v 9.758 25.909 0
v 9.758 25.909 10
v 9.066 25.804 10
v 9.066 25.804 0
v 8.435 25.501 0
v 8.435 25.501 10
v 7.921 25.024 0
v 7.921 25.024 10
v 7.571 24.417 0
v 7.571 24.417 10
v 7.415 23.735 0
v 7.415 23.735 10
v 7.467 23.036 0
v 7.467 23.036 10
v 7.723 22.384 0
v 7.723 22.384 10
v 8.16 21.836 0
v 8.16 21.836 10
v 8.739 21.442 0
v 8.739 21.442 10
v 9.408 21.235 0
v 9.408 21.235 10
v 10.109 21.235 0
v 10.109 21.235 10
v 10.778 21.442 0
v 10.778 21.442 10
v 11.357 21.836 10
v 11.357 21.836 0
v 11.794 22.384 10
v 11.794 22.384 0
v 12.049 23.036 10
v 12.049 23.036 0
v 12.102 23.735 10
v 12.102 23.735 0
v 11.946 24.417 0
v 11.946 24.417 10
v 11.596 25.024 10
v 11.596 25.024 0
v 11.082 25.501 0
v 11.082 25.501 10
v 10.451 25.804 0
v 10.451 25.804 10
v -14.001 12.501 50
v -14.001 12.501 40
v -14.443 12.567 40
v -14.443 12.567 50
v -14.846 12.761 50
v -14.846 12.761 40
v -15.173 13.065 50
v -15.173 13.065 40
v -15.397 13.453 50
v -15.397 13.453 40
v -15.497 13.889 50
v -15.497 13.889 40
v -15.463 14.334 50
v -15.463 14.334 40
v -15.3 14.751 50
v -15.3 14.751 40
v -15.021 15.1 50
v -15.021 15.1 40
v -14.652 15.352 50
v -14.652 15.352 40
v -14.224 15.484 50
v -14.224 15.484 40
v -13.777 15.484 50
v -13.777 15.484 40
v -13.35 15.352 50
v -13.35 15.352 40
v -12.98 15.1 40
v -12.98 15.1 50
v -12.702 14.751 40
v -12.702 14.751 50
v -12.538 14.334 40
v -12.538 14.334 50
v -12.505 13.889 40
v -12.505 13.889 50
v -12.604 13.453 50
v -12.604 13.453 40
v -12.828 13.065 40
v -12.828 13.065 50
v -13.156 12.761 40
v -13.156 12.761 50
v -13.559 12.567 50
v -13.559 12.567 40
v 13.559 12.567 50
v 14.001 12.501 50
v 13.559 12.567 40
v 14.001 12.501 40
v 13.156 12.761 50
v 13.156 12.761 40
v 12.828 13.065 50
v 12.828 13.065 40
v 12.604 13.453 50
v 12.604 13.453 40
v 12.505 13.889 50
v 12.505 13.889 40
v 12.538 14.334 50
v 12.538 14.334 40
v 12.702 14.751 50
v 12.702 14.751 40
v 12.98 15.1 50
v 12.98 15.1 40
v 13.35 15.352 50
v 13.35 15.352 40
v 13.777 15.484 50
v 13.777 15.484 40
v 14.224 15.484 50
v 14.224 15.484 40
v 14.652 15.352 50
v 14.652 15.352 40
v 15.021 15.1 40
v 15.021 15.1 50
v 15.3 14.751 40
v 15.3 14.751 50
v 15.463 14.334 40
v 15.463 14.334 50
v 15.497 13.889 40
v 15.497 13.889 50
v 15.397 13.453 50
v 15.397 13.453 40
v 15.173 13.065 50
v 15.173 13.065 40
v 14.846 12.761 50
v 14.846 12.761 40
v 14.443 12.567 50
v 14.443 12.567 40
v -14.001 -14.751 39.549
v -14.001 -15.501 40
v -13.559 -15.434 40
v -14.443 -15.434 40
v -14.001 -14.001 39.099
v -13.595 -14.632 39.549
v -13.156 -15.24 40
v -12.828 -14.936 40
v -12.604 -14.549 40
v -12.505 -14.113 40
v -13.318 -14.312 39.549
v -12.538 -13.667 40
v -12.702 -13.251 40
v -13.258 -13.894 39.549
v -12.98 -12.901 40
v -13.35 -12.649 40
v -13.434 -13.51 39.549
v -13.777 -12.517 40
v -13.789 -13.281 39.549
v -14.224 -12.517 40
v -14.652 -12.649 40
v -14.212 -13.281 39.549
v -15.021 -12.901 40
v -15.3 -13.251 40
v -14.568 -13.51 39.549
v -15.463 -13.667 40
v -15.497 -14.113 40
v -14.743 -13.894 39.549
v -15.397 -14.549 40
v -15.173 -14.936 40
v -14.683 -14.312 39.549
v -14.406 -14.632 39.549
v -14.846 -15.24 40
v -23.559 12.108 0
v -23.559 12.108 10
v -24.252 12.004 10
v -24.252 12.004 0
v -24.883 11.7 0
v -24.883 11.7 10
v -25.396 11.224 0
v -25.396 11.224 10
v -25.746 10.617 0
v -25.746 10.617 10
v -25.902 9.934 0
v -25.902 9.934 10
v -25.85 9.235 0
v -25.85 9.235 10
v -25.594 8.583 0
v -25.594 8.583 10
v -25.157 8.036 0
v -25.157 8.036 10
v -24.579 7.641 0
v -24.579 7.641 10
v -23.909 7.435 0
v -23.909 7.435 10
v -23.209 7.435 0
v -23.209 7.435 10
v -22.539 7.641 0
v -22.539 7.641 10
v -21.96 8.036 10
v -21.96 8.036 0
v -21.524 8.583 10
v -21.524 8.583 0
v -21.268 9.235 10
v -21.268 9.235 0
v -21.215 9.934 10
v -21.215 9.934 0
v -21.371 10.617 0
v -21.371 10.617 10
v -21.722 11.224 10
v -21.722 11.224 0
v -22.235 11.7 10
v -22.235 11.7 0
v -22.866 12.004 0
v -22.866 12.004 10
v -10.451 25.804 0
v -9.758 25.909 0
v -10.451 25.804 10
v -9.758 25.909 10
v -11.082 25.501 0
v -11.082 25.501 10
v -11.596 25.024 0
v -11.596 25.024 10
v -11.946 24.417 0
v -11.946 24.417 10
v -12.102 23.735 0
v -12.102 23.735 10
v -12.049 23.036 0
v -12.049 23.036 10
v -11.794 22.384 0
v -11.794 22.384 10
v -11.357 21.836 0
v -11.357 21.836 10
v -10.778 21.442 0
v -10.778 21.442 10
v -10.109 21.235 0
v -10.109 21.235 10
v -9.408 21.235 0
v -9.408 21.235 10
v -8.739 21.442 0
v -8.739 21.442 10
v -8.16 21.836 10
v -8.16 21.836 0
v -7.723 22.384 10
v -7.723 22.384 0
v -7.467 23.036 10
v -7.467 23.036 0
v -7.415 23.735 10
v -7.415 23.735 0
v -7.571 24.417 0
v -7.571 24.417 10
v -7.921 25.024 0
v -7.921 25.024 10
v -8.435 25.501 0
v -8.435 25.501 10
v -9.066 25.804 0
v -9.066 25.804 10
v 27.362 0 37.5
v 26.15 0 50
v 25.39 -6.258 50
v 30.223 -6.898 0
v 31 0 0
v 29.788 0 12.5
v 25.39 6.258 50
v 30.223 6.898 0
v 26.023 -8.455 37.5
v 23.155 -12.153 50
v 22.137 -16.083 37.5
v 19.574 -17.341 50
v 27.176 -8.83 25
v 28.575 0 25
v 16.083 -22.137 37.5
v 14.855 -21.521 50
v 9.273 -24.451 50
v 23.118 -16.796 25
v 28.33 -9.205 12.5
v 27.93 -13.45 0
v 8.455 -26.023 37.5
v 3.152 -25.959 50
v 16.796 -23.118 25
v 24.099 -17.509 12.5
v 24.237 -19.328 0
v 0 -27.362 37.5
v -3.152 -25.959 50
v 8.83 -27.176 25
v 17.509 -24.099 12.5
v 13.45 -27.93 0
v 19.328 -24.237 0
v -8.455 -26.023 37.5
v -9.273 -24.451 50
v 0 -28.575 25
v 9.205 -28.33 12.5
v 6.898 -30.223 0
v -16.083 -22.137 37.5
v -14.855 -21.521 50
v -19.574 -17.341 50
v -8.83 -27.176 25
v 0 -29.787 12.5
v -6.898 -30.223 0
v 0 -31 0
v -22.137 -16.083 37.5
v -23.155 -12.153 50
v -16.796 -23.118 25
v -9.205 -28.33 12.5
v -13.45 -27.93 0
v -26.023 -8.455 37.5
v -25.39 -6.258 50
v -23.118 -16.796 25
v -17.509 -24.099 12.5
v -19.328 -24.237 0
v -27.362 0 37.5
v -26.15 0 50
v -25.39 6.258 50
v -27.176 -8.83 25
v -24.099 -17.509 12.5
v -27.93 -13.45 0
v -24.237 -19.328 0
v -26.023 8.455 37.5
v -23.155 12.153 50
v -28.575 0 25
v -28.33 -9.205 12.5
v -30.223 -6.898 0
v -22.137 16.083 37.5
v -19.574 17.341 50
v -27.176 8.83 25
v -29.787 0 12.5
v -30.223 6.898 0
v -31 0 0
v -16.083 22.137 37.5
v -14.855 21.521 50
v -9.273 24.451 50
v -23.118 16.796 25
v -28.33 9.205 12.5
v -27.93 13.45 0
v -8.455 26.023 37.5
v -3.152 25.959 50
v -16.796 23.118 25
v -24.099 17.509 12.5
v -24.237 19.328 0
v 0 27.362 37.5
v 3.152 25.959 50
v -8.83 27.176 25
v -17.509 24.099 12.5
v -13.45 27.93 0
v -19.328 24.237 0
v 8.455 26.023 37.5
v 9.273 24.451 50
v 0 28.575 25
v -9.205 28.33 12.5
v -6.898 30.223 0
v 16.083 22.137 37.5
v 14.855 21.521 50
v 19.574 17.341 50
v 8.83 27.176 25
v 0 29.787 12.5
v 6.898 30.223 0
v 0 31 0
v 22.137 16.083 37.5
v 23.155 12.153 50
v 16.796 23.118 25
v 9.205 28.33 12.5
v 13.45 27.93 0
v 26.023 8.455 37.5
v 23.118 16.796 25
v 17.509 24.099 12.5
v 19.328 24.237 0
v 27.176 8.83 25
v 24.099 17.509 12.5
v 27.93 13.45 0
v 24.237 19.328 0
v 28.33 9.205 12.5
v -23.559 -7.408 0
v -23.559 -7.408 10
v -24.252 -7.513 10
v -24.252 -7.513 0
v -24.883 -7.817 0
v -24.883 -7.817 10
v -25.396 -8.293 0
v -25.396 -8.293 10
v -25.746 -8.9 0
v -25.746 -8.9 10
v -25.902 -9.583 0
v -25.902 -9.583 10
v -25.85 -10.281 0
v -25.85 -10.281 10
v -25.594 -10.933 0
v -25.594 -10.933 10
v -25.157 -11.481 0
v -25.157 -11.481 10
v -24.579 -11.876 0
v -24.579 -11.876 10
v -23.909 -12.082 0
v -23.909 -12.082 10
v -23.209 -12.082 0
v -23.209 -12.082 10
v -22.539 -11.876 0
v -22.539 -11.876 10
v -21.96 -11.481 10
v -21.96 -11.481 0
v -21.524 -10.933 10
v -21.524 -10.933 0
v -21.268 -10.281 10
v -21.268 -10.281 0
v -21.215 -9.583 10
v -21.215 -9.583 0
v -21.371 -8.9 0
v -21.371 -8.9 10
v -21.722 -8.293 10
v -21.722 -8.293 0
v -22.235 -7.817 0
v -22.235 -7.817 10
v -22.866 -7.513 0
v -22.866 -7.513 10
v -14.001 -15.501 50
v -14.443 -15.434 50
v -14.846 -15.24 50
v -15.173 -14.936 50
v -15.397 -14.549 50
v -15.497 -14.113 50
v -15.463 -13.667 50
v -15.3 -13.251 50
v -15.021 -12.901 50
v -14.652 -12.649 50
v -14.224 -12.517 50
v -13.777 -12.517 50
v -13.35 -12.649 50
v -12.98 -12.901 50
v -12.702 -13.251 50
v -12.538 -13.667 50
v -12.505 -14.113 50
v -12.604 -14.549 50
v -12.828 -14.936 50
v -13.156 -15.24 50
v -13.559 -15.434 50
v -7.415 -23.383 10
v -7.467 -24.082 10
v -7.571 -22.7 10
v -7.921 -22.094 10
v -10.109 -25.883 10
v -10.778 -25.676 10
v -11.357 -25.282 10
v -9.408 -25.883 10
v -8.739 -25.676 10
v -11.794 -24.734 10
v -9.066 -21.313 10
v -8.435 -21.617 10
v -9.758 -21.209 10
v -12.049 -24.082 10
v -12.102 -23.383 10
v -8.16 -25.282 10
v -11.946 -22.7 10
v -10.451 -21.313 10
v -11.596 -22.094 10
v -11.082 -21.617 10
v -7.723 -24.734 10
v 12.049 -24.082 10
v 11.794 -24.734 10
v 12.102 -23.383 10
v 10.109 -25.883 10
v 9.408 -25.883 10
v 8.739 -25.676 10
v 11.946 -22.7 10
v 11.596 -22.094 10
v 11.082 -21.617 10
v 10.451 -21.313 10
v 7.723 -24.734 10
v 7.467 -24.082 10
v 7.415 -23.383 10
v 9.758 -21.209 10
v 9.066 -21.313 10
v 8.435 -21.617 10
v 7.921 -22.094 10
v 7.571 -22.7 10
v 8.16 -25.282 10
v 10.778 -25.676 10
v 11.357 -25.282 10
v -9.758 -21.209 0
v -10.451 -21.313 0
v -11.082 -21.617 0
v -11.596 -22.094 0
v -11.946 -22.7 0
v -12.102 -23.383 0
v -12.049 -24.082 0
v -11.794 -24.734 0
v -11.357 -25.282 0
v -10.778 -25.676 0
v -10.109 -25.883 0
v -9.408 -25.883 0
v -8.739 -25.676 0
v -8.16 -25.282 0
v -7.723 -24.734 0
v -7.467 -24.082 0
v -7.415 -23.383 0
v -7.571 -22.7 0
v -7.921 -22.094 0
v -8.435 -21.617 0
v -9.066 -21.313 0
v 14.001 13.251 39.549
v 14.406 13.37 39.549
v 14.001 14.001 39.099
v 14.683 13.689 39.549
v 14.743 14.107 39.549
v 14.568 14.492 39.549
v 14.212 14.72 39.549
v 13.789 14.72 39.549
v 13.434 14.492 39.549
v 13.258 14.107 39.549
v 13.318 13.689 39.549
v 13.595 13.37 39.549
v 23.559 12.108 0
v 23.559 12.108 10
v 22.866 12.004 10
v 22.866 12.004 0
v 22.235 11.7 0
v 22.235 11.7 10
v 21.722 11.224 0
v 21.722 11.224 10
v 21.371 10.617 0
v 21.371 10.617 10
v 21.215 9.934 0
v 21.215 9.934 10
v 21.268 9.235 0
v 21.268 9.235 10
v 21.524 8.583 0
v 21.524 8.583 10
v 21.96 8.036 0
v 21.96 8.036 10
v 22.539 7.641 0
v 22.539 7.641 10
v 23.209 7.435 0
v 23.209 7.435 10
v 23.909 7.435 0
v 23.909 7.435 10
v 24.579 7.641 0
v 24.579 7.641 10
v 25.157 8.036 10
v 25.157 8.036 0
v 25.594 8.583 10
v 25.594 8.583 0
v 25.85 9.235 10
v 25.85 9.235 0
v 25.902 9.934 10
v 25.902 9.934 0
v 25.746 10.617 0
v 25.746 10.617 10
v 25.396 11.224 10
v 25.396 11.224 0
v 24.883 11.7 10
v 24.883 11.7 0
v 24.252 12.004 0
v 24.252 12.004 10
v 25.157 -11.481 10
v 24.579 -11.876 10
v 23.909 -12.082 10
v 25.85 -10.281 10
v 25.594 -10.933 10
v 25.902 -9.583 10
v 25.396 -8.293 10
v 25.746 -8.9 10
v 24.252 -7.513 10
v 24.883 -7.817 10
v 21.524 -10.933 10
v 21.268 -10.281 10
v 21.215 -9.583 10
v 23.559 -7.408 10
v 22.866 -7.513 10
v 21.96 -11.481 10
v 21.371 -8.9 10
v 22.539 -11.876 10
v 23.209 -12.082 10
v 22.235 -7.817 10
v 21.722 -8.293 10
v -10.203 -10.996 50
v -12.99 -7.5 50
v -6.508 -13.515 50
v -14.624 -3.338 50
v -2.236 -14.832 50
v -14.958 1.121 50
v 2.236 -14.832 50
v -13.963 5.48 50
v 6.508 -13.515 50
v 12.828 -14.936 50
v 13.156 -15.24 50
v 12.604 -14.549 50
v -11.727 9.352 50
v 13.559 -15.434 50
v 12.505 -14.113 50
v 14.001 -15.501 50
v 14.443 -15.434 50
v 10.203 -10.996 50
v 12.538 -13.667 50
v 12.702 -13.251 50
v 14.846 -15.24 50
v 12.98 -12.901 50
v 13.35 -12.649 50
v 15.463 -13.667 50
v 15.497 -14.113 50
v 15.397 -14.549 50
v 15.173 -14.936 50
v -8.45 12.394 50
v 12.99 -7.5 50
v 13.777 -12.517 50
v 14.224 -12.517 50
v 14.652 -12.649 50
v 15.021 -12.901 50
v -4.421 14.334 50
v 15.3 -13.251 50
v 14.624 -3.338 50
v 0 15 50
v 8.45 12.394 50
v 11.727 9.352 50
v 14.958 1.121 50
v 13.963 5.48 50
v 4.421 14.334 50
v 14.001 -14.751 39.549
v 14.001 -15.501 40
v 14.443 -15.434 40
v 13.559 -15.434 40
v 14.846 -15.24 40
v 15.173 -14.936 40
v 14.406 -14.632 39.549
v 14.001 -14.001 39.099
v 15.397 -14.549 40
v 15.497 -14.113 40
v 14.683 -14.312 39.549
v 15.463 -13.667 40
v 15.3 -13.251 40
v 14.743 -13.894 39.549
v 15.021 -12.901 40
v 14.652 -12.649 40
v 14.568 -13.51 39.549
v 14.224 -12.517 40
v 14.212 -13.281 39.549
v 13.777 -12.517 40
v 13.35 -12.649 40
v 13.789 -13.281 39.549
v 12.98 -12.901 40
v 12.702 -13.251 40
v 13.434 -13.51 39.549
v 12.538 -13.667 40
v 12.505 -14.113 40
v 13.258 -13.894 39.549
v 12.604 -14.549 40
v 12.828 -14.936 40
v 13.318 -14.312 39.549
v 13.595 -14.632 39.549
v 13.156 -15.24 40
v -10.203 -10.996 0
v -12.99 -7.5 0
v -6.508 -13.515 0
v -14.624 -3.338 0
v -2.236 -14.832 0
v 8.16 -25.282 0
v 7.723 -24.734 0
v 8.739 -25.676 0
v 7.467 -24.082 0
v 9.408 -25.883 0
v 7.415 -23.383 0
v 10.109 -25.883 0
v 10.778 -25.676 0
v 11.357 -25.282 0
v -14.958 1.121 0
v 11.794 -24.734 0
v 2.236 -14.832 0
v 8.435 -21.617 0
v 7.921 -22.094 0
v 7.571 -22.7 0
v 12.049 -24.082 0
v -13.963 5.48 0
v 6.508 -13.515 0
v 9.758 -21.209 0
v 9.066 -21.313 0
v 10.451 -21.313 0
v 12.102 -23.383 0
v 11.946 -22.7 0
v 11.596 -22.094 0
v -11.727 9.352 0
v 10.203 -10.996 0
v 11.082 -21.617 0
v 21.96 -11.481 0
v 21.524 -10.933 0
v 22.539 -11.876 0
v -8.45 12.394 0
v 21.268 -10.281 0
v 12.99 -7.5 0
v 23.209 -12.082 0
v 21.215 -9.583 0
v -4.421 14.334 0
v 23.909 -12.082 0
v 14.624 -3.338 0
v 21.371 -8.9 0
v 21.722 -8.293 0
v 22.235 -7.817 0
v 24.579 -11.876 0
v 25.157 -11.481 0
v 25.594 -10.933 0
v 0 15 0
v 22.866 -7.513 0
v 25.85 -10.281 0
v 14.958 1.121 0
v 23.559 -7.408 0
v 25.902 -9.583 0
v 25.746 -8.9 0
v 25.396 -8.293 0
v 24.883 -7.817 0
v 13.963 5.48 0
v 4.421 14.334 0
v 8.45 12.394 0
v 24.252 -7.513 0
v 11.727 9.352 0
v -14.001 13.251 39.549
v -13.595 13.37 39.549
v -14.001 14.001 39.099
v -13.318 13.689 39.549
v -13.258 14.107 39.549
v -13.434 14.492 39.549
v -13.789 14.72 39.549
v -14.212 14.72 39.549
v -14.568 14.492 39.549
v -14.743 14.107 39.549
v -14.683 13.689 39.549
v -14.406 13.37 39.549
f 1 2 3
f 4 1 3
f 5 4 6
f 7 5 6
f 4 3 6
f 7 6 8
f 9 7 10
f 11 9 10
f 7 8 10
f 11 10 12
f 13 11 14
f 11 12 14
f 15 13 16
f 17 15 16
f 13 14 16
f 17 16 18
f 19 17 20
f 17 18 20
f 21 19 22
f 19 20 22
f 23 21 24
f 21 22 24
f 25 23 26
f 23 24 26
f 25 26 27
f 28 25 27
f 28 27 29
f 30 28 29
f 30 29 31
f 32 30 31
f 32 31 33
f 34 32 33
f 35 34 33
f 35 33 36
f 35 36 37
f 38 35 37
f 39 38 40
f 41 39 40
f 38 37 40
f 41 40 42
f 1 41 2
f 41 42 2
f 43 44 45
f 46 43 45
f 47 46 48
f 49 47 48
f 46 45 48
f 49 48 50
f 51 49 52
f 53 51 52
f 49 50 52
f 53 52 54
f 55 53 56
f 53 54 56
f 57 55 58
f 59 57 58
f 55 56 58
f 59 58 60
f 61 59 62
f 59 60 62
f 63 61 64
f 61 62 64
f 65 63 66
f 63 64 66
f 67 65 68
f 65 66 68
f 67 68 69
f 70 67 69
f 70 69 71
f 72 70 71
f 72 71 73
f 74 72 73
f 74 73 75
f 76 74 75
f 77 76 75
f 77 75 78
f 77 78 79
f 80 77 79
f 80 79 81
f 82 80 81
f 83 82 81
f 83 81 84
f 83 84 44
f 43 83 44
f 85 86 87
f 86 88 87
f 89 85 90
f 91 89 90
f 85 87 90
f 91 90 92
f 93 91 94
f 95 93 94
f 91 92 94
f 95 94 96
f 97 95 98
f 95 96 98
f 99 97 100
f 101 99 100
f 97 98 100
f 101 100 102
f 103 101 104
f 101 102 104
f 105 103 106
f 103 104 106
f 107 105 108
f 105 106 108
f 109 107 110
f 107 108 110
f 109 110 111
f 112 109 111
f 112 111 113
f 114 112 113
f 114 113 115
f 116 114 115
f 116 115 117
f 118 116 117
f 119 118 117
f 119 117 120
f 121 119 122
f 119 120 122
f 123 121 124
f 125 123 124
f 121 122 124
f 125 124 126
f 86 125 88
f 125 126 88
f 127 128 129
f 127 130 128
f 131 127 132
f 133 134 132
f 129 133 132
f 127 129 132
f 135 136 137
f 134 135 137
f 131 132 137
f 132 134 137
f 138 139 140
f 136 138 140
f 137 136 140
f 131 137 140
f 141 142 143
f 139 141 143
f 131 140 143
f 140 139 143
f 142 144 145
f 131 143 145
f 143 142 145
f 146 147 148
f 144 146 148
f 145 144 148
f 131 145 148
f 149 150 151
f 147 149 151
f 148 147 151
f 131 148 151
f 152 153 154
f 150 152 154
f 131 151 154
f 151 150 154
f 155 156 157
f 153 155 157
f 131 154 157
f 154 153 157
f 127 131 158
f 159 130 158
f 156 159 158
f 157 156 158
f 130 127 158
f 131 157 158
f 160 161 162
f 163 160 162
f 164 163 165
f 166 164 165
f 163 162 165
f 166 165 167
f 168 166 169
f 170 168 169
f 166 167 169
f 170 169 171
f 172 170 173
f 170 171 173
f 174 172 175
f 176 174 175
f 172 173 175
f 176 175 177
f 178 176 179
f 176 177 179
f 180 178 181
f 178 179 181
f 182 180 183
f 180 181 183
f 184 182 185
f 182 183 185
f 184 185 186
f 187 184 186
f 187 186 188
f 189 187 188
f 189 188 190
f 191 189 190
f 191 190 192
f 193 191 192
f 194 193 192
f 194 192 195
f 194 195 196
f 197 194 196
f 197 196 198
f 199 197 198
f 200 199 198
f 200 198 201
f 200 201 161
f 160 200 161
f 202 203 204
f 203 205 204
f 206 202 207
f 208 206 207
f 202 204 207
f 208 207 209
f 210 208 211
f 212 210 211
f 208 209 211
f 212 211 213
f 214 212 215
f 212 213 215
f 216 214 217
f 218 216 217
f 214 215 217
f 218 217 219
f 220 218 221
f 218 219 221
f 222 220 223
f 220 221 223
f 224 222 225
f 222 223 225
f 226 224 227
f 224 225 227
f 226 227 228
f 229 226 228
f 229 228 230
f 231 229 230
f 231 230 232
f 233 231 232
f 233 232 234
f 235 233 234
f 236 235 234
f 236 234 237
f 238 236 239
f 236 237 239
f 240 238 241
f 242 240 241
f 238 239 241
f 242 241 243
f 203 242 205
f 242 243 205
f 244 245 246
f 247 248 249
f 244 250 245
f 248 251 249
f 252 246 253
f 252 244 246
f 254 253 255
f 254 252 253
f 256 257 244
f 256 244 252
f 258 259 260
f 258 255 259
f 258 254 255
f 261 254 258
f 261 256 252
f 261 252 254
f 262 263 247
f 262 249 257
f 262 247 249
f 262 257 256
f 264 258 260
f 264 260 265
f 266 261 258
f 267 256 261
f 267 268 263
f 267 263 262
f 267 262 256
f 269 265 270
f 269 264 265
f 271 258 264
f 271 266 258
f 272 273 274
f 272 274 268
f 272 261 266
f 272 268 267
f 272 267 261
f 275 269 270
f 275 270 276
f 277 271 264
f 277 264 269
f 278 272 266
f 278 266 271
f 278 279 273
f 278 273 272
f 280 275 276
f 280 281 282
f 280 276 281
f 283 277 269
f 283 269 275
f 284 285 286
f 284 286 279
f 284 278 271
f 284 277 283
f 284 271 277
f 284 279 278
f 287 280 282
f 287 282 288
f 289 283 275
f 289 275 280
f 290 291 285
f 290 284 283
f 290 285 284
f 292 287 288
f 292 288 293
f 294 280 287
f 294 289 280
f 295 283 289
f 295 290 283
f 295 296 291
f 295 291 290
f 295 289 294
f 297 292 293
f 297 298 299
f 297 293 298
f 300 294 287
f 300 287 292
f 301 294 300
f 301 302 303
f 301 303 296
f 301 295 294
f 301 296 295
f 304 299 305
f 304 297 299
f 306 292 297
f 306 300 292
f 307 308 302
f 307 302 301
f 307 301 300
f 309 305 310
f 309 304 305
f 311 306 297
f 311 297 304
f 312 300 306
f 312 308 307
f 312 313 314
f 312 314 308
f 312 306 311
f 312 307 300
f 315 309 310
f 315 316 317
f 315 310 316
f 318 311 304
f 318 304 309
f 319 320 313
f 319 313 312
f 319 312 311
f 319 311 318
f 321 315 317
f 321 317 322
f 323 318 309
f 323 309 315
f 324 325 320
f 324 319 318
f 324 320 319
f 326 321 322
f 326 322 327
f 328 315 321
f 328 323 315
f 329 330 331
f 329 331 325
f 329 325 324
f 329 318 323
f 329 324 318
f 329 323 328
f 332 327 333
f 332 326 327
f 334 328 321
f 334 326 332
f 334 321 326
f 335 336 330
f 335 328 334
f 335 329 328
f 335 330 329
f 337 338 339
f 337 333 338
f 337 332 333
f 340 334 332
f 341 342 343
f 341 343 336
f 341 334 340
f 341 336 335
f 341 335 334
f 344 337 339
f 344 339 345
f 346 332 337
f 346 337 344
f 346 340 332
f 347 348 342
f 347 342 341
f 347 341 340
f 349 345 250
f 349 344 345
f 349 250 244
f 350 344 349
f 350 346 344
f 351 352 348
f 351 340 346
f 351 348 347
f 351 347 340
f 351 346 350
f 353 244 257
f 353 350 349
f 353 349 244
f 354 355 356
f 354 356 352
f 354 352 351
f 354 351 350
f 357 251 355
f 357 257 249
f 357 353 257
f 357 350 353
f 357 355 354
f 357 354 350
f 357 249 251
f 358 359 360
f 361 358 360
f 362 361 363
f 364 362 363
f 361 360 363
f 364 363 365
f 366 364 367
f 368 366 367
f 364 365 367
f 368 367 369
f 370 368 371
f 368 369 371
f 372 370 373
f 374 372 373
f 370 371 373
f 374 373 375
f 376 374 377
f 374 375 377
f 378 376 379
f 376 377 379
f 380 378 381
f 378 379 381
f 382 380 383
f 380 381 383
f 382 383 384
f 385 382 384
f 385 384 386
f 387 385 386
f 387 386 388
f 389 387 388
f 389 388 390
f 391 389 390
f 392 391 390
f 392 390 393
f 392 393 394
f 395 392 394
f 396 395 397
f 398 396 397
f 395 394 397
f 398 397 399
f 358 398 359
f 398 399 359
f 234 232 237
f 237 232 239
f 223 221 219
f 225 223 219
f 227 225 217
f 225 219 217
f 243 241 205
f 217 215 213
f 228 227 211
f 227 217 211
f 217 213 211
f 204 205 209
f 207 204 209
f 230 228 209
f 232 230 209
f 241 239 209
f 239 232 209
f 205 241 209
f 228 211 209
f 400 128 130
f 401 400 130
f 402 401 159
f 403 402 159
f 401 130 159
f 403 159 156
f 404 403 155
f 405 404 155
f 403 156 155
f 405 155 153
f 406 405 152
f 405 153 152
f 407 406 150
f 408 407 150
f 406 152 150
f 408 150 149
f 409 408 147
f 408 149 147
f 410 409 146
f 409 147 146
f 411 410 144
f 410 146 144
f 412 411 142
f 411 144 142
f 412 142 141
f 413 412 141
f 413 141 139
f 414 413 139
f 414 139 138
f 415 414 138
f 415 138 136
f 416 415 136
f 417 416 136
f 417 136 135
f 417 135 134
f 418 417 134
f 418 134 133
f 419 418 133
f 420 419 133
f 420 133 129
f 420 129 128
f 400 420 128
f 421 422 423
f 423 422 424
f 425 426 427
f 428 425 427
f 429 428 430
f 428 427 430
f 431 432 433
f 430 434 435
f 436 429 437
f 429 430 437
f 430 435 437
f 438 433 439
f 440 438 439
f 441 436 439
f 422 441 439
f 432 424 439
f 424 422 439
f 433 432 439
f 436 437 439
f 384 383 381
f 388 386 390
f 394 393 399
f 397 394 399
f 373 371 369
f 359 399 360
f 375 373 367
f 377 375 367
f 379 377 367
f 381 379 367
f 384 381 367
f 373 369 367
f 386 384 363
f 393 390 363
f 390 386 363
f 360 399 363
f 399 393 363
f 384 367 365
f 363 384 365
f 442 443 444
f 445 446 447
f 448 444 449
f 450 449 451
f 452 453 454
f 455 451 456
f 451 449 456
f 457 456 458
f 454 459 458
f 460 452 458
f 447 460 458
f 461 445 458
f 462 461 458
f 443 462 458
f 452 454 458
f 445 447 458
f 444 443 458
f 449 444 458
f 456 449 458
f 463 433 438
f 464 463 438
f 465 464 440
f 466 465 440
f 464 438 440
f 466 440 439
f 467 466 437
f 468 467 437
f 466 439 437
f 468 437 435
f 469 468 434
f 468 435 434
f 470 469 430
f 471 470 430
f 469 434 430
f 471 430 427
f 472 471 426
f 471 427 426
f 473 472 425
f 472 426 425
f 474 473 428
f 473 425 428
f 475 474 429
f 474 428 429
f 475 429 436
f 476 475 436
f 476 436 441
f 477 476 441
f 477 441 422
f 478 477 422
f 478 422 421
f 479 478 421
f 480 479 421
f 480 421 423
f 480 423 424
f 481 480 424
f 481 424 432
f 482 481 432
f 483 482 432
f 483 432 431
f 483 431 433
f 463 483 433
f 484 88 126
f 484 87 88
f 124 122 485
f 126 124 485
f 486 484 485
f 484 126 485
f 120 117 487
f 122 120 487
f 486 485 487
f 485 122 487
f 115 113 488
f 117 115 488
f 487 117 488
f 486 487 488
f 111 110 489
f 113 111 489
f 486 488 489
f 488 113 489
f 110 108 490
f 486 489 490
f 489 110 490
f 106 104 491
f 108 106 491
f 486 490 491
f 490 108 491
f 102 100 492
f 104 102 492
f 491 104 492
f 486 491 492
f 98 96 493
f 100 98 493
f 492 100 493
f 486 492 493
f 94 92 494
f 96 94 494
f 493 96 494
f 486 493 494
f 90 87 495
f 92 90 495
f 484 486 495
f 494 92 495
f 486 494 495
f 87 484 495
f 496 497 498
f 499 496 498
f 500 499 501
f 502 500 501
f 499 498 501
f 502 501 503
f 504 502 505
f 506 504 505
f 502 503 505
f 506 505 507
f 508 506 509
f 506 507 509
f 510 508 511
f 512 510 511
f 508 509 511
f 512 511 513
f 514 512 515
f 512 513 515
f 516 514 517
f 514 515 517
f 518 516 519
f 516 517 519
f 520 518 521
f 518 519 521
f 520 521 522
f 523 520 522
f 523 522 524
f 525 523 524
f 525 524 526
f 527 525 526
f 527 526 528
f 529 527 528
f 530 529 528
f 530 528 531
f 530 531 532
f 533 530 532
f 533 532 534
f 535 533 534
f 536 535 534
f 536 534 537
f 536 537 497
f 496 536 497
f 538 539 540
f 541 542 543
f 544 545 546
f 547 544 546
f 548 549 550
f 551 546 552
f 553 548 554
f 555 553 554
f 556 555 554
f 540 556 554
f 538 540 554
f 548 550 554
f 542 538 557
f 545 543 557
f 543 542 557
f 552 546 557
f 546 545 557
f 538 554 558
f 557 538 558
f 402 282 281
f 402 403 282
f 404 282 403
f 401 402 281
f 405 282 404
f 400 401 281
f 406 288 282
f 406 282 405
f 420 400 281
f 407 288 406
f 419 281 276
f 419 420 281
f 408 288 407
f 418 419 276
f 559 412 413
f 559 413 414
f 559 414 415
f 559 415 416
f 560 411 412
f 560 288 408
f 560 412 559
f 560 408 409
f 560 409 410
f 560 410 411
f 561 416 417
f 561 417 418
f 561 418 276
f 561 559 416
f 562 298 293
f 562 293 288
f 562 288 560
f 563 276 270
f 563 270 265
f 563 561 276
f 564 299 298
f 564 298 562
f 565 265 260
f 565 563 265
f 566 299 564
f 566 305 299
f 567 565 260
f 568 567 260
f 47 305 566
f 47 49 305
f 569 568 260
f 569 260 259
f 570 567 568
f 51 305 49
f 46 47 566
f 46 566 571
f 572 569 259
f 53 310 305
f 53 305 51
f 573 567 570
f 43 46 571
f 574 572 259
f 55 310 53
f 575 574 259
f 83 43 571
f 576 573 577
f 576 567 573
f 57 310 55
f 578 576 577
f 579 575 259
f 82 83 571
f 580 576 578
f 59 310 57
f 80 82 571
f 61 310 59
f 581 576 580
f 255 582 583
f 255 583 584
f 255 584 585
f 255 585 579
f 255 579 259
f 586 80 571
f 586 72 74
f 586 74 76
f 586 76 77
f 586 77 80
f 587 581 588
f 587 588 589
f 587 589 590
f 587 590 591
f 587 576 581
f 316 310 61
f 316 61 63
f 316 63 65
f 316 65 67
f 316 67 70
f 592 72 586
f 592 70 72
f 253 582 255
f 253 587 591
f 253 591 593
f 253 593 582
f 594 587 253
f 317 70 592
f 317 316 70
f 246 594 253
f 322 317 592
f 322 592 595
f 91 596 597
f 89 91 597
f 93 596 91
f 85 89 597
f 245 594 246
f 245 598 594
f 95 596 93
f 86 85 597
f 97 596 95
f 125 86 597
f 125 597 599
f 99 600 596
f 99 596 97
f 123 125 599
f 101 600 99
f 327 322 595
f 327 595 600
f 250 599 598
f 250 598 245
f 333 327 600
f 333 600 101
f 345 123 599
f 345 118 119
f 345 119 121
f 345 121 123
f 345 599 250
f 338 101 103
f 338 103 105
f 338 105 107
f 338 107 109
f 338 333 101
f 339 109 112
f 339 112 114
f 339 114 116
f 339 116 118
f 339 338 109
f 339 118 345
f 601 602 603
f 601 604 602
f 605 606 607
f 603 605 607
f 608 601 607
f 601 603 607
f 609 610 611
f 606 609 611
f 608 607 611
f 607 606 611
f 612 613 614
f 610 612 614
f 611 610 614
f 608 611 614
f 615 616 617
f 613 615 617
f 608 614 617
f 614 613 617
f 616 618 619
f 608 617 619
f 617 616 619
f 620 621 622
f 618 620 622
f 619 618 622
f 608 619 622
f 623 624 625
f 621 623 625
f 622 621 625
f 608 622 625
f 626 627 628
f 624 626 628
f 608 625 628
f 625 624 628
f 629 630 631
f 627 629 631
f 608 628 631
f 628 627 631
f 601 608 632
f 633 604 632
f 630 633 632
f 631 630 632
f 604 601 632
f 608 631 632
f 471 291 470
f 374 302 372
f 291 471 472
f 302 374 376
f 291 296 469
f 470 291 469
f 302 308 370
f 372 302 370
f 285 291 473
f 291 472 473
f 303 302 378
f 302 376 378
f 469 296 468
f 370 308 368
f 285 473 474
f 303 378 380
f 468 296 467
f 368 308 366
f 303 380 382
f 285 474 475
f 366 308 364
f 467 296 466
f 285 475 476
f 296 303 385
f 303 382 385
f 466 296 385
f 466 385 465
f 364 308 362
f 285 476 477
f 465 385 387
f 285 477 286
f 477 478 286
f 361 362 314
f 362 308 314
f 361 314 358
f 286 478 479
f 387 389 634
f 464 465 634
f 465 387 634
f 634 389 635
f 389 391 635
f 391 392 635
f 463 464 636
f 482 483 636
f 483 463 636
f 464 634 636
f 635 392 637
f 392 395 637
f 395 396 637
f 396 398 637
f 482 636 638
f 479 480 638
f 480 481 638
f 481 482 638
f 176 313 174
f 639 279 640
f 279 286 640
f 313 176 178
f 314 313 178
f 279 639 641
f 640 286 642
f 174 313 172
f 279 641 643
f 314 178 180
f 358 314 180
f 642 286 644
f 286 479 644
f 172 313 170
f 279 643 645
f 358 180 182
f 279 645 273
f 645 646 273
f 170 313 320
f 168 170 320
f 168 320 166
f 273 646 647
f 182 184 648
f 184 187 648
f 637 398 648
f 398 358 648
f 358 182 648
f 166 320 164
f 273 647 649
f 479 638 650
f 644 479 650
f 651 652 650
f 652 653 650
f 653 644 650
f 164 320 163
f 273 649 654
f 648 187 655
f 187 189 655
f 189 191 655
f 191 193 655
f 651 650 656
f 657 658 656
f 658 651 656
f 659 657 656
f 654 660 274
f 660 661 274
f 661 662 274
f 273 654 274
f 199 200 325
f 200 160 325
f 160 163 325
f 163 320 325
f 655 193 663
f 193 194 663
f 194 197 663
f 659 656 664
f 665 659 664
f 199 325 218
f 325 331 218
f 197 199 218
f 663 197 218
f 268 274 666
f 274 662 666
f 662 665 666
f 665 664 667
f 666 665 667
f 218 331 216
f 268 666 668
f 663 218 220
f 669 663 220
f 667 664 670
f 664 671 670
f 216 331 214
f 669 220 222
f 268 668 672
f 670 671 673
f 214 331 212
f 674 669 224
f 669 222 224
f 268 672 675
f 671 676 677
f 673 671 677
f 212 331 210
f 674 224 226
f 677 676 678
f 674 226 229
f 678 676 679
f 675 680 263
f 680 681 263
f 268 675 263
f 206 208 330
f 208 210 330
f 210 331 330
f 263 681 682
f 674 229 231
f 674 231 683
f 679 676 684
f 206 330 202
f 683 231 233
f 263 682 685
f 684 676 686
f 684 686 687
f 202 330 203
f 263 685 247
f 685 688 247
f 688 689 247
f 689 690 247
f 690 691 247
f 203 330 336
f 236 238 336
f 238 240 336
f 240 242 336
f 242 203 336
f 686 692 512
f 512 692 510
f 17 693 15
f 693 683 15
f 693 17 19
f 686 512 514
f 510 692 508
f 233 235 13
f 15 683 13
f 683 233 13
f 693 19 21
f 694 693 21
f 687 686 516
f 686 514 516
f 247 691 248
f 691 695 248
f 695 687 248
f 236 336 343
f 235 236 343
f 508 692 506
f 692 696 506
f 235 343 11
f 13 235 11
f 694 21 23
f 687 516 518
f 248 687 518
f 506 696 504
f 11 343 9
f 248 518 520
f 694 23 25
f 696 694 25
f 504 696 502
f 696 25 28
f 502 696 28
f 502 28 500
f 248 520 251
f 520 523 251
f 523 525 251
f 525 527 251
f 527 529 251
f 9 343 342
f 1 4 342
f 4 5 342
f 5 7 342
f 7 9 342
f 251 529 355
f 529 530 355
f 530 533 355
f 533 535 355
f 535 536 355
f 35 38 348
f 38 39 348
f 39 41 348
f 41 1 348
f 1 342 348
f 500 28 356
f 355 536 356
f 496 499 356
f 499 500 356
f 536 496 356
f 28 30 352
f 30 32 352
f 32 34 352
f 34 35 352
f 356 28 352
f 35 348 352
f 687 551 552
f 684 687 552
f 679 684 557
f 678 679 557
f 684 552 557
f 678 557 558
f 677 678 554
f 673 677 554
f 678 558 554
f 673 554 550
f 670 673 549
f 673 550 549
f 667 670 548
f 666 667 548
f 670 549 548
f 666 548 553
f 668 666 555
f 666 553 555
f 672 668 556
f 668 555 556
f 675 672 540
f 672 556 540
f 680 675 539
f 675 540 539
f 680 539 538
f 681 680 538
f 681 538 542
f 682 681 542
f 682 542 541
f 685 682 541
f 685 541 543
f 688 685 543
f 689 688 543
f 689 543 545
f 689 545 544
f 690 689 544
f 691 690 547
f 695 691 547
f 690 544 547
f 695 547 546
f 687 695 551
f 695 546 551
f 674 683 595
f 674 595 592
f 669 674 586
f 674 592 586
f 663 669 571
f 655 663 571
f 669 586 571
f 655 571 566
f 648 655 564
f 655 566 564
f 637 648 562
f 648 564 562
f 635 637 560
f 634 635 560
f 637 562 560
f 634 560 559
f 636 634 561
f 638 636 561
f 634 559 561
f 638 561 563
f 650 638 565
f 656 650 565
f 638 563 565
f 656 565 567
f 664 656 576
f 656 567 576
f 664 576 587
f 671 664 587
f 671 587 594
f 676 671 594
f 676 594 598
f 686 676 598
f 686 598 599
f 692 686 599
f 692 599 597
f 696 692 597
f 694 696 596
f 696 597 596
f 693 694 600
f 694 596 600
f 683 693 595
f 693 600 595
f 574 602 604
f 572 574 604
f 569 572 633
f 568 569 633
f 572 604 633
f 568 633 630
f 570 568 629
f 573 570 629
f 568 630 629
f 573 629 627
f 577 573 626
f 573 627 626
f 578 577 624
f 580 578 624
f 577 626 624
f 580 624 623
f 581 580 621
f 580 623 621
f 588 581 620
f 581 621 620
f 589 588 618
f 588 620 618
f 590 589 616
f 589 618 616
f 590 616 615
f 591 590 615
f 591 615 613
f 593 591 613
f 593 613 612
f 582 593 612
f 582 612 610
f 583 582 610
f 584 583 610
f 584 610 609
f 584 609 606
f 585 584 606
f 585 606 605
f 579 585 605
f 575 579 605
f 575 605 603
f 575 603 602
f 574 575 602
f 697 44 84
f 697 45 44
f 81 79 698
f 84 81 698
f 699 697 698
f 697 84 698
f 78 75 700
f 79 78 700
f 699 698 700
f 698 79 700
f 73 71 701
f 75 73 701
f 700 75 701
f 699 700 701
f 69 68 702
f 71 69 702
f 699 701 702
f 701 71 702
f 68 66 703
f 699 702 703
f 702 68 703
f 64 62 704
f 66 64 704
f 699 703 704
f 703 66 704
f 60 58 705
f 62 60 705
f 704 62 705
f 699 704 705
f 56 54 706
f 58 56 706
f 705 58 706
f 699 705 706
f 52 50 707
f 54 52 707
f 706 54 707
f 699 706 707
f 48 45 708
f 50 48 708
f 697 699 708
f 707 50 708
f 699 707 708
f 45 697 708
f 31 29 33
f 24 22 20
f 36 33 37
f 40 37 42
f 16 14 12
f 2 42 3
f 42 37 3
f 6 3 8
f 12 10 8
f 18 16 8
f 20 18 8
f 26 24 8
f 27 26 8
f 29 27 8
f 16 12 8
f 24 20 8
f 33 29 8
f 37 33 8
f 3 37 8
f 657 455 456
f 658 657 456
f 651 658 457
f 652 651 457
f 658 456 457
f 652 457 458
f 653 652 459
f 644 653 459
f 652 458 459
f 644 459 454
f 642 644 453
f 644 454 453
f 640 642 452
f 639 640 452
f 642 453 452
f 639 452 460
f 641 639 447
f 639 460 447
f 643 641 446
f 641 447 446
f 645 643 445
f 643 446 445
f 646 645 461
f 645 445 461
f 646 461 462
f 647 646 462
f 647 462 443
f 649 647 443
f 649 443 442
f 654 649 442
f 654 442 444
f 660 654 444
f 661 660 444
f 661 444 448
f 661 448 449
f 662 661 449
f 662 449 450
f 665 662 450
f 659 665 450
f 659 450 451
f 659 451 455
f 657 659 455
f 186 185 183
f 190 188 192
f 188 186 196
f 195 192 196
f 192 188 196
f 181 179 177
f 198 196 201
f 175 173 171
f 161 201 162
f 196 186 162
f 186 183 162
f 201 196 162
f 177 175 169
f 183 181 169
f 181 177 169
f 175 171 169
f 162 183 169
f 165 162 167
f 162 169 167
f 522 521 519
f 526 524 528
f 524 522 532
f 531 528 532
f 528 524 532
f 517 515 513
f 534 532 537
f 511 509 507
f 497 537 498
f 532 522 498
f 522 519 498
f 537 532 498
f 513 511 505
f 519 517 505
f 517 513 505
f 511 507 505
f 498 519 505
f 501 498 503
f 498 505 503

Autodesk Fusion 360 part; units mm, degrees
sketch "草图1" plane through (0, 0, 0) normal (0, 0, 1) x (1, 0, 0)
  circle A0 centre (0, 0) radius 26.15 construction
  circle A1 centre (0, 0) radius 25.5 construction
  circle A2 centre (0, 0) radius 31
  line L0 (0, 0) -> (46, 0) construction
  line L1 (0, 0) -> (0, 44.4165) construction
  line L2 (0, 0) -> (38.8757, 16.1028) construction
  circle A3 centre (23.5589, 9.7584) radius 2.35
  circle A4 centre (9.7584, 23.5589) radius 2.35
  circle A5 centre (-9.7584, 23.5589) radius 2.35
  circle A6 centre (-23.5589, 9.7584) radius 2.35
  circle A7 centre (-23.5589, -9.7584) radius 2.35
  circle A8 centre (-9.7584, -23.5589) radius 2.35
  circle A9 centre (9.7584, -23.5589) radius 2.35
  circle A10 centre (23.5589, -9.7584) radius 2.35
  dimension "d1" = 52.3
  dimension "d2" = 51
  dimension "d3" = 62
  dimension "d4" = 22.5
  dimension "d5" = 4.7
  dimension "d8" = 0
  dimension "d9" = 0
  dimension "d11" = 360
ref_plane "工作平面1" through (0, 0, 50) normal (0, 0, 1) x (1, 0, 0)
sketch "草图2" plane through (0, 0, 50) normal (0, 0, 1) x (1, 0, 0)
  circle A0 centre (0, 0) radius 26.15
  circle A1 centre (0, 0) radius 19.8 construction
  line L0 (0, 0) -> (28.4429, 28.4429) construction
  line L1 (0, 0) -> (40.2244, 0) construction
  circle A2 centre (14.0007, 14.0007) radius 1.5
  circle A3 centre (-14.0007, 14.0007) radius 1.5
  circle A4 centre (-14.0007, -14.0007) radius 1.5
  circle A5 centre (14.0007, -14.0007) radius 1.5
  circle A6 centre (14.0007, 14.0007) radius 1.5
  circle A7 centre (-14.0007, 14.0007) radius 1.5
  circle A8 centre (-14.0007, -14.0007) radius 1.5
  circle A9 centre (14.0007, -14.0007) radius 1.5
  dimension "d13" = 52.3
  dimension "d14" = 39.6
  dimension "d15" = 45
  dimension "d16" = 3
  dimension "d18" = 360
  dimension "d19" = 3
loft "放样1" add profiles "草图1", "草图2" section 1 section 2
sketch "草图3" plane through (0, 0, 50) normal (0, 0, 1) x (-1, 0, 0)
  circle A0 centre (0, 0) radius 26.15
  line L0 (0, 0) -> (-33, 0) construction
  line L1 (0, 0) -> (0, -36) construction
  line L2 (0, 0) -> (-34.5137, -34.5137) construction
  circle A1 centre (0, 0) radius 19.8 construction
  circle A2 centre (-14.0007, -14.0007) radius 1.5
  circle A3 centre (14.0007, -14.0007) radius 1.5
  circle A4 centre (14.0007, 14.0007) radius 1.5
  circle A5 centre (-14.0007, 14.0007) radius 1.5
  dimension "d20" = 45
  dimension "d21" = 39.6
  dimension "d22" = 3
  dimension "d24" = 360
hole "孔1" at (14.0007, 14.0007, 50) at (-14.0007, 14.0007, 50) at (-14.0007, -14.0007, 50) at (14.0007, -14.0007, 50) direction (0, 0, -1) diameter 3 depth 10 tip angle 118
sketch "草图4" plane through (0, 0, 0) normal (0, 0, -1) x (1, 0, 0)
  circle A0 centre (0, 0) radius 31
  line L0 (0, 0) -> (47.5733, 0) construction
  line L1 (0, 0) -> (0, -48.4854) construction
  line L2 (0, 0) -> (51.3087, -21.2528) construction
  circle A1 centre (0, 0) radius 25.5 construction
  circle A2 centre (23.5589, -9.7584) radius 2.35
  circle A3 centre (23.5589, 9.7584) radius 2.35
  circle A4 centre (9.7584, 23.5589) radius 2.35
  circle A5 centre (-9.7584, 23.5589) radius 2.35
  circle A6 centre (-23.5589, 9.7584) radius 2.35
  circle A7 centre (-23.5589, -9.7584) radius 2.35
  circle A8 centre (-9.7584, -23.5589) radius 2.35
  circle A9 centre (9.7584, -23.5589) radius 2.35
  dimension "d28" = 22.5
  dimension "d29" = 51
  dimension "d30" = 4.7
  dimension "d32" = 360
hole "孔2" at (9.7584, -23.5589, 0) at (-9.7584, -23.5589, 0) at (-23.5589, -9.7584, 0) at (-23.5589, 9.7584, 0) at (-9.7584, 23.5589, 0) at (9.7584, 23.5589, 0) at (23.5589, 9.7584, 0) at (23.5589, -9.7584, 0) direction (0, 0, 1) diameter 4.7 depth 10 tip angle 180
hole "孔3" at (0, 0, 0) direction (0, 0, 1) diameter 30 end through all
